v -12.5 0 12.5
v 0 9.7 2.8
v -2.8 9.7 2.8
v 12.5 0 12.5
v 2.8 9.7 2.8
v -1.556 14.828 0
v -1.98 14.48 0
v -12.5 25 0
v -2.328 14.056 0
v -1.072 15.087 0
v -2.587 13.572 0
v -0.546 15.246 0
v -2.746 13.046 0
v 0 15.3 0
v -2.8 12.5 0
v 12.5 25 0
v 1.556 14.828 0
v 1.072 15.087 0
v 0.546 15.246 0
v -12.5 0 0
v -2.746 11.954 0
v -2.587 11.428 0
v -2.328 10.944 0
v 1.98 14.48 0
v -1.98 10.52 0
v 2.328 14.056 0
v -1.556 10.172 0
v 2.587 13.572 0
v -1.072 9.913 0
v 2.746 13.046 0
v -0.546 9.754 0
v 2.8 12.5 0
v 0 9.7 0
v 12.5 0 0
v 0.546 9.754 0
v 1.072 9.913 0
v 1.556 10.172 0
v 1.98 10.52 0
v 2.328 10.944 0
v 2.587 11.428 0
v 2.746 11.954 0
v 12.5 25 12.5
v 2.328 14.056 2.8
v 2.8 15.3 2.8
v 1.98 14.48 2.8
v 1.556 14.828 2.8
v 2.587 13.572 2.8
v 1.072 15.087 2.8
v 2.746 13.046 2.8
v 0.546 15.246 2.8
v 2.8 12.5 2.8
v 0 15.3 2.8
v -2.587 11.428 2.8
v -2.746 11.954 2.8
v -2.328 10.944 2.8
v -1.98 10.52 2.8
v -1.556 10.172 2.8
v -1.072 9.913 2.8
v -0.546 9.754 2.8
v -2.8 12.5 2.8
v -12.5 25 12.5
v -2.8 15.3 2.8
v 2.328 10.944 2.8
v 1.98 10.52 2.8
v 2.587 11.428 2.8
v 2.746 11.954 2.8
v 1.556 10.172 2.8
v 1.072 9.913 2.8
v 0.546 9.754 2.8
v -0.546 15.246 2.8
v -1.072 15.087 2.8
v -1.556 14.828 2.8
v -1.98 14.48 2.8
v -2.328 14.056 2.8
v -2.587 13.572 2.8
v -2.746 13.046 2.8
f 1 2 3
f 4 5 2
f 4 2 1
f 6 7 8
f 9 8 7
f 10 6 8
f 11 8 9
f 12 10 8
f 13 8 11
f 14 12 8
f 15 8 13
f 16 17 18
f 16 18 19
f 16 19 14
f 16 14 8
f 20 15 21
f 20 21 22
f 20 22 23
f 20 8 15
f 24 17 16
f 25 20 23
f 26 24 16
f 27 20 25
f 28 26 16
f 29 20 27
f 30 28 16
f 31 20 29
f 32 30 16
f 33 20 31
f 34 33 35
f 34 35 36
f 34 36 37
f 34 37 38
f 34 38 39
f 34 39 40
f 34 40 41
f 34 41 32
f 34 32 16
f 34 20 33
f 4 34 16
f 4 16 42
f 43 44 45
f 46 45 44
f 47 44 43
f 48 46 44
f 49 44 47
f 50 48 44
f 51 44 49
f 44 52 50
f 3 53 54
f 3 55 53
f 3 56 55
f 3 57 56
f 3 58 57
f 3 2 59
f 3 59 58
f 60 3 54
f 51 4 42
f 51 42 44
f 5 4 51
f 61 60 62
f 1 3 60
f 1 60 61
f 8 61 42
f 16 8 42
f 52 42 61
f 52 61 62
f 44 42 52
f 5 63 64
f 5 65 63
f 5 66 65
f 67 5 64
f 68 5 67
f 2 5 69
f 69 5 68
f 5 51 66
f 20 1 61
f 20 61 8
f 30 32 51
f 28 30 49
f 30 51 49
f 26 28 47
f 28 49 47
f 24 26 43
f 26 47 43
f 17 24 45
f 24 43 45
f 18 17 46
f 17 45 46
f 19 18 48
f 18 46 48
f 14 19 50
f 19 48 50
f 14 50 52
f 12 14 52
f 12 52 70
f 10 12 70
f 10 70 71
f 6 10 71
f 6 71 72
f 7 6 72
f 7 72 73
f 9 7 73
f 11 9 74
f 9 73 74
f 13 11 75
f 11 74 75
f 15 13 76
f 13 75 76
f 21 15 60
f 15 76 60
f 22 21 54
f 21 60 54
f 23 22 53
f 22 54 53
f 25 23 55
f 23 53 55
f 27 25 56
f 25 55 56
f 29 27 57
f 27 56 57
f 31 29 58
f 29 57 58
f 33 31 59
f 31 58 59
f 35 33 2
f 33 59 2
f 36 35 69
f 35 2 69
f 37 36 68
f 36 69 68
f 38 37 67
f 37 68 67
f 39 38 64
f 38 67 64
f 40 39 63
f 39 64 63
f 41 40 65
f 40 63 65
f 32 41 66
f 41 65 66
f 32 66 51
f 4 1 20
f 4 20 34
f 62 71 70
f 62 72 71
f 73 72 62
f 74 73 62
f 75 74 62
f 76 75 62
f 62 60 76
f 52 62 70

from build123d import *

# Parameters (mm, degrees)
F1_DEPTH = 25
F3_DEPTH = 25
F4_R     = 2.8
F5_DEPTH = 2.801


with BuildPart() as f1:
    # F0 (on Front) → F1 (new body)
    with BuildSketch(Plane.XZ):
        Polygon((-12.5, 12.5), (-12.5, 0), (0, 0), (-2.8, 2.8), align=None)
        Polygon((2.8, 2.8), (0, 0), (12.5, 0), (12.5, 12.5), align=None)
        Polygon((-2.8, 2.8), (0, 0), (2.8, 2.8), align=None)
    extrude(amount=-F1_DEPTH)

    # F2 (on face) → F3 (join)
    with BuildSketch(Plane.YZ.offset(12.5)):
        Polygon((0, 0), (12.5, 0), (0, 12.5), align=None)
        Polygon((25, 12.5), (12.5, 0), (25, 0), align=None)
    extrude(amount=-F3_DEPTH)

    # F4 (on face) → F5 (cut, through all)
    with BuildSketch(Plane.XY.offset(2.8)):
        with Locations((0, 12.5)):
            Circle(F4_R)
    extrude(amount=-F5_DEPTH, mode=Mode.SUBTRACT)


solid = f1.part
